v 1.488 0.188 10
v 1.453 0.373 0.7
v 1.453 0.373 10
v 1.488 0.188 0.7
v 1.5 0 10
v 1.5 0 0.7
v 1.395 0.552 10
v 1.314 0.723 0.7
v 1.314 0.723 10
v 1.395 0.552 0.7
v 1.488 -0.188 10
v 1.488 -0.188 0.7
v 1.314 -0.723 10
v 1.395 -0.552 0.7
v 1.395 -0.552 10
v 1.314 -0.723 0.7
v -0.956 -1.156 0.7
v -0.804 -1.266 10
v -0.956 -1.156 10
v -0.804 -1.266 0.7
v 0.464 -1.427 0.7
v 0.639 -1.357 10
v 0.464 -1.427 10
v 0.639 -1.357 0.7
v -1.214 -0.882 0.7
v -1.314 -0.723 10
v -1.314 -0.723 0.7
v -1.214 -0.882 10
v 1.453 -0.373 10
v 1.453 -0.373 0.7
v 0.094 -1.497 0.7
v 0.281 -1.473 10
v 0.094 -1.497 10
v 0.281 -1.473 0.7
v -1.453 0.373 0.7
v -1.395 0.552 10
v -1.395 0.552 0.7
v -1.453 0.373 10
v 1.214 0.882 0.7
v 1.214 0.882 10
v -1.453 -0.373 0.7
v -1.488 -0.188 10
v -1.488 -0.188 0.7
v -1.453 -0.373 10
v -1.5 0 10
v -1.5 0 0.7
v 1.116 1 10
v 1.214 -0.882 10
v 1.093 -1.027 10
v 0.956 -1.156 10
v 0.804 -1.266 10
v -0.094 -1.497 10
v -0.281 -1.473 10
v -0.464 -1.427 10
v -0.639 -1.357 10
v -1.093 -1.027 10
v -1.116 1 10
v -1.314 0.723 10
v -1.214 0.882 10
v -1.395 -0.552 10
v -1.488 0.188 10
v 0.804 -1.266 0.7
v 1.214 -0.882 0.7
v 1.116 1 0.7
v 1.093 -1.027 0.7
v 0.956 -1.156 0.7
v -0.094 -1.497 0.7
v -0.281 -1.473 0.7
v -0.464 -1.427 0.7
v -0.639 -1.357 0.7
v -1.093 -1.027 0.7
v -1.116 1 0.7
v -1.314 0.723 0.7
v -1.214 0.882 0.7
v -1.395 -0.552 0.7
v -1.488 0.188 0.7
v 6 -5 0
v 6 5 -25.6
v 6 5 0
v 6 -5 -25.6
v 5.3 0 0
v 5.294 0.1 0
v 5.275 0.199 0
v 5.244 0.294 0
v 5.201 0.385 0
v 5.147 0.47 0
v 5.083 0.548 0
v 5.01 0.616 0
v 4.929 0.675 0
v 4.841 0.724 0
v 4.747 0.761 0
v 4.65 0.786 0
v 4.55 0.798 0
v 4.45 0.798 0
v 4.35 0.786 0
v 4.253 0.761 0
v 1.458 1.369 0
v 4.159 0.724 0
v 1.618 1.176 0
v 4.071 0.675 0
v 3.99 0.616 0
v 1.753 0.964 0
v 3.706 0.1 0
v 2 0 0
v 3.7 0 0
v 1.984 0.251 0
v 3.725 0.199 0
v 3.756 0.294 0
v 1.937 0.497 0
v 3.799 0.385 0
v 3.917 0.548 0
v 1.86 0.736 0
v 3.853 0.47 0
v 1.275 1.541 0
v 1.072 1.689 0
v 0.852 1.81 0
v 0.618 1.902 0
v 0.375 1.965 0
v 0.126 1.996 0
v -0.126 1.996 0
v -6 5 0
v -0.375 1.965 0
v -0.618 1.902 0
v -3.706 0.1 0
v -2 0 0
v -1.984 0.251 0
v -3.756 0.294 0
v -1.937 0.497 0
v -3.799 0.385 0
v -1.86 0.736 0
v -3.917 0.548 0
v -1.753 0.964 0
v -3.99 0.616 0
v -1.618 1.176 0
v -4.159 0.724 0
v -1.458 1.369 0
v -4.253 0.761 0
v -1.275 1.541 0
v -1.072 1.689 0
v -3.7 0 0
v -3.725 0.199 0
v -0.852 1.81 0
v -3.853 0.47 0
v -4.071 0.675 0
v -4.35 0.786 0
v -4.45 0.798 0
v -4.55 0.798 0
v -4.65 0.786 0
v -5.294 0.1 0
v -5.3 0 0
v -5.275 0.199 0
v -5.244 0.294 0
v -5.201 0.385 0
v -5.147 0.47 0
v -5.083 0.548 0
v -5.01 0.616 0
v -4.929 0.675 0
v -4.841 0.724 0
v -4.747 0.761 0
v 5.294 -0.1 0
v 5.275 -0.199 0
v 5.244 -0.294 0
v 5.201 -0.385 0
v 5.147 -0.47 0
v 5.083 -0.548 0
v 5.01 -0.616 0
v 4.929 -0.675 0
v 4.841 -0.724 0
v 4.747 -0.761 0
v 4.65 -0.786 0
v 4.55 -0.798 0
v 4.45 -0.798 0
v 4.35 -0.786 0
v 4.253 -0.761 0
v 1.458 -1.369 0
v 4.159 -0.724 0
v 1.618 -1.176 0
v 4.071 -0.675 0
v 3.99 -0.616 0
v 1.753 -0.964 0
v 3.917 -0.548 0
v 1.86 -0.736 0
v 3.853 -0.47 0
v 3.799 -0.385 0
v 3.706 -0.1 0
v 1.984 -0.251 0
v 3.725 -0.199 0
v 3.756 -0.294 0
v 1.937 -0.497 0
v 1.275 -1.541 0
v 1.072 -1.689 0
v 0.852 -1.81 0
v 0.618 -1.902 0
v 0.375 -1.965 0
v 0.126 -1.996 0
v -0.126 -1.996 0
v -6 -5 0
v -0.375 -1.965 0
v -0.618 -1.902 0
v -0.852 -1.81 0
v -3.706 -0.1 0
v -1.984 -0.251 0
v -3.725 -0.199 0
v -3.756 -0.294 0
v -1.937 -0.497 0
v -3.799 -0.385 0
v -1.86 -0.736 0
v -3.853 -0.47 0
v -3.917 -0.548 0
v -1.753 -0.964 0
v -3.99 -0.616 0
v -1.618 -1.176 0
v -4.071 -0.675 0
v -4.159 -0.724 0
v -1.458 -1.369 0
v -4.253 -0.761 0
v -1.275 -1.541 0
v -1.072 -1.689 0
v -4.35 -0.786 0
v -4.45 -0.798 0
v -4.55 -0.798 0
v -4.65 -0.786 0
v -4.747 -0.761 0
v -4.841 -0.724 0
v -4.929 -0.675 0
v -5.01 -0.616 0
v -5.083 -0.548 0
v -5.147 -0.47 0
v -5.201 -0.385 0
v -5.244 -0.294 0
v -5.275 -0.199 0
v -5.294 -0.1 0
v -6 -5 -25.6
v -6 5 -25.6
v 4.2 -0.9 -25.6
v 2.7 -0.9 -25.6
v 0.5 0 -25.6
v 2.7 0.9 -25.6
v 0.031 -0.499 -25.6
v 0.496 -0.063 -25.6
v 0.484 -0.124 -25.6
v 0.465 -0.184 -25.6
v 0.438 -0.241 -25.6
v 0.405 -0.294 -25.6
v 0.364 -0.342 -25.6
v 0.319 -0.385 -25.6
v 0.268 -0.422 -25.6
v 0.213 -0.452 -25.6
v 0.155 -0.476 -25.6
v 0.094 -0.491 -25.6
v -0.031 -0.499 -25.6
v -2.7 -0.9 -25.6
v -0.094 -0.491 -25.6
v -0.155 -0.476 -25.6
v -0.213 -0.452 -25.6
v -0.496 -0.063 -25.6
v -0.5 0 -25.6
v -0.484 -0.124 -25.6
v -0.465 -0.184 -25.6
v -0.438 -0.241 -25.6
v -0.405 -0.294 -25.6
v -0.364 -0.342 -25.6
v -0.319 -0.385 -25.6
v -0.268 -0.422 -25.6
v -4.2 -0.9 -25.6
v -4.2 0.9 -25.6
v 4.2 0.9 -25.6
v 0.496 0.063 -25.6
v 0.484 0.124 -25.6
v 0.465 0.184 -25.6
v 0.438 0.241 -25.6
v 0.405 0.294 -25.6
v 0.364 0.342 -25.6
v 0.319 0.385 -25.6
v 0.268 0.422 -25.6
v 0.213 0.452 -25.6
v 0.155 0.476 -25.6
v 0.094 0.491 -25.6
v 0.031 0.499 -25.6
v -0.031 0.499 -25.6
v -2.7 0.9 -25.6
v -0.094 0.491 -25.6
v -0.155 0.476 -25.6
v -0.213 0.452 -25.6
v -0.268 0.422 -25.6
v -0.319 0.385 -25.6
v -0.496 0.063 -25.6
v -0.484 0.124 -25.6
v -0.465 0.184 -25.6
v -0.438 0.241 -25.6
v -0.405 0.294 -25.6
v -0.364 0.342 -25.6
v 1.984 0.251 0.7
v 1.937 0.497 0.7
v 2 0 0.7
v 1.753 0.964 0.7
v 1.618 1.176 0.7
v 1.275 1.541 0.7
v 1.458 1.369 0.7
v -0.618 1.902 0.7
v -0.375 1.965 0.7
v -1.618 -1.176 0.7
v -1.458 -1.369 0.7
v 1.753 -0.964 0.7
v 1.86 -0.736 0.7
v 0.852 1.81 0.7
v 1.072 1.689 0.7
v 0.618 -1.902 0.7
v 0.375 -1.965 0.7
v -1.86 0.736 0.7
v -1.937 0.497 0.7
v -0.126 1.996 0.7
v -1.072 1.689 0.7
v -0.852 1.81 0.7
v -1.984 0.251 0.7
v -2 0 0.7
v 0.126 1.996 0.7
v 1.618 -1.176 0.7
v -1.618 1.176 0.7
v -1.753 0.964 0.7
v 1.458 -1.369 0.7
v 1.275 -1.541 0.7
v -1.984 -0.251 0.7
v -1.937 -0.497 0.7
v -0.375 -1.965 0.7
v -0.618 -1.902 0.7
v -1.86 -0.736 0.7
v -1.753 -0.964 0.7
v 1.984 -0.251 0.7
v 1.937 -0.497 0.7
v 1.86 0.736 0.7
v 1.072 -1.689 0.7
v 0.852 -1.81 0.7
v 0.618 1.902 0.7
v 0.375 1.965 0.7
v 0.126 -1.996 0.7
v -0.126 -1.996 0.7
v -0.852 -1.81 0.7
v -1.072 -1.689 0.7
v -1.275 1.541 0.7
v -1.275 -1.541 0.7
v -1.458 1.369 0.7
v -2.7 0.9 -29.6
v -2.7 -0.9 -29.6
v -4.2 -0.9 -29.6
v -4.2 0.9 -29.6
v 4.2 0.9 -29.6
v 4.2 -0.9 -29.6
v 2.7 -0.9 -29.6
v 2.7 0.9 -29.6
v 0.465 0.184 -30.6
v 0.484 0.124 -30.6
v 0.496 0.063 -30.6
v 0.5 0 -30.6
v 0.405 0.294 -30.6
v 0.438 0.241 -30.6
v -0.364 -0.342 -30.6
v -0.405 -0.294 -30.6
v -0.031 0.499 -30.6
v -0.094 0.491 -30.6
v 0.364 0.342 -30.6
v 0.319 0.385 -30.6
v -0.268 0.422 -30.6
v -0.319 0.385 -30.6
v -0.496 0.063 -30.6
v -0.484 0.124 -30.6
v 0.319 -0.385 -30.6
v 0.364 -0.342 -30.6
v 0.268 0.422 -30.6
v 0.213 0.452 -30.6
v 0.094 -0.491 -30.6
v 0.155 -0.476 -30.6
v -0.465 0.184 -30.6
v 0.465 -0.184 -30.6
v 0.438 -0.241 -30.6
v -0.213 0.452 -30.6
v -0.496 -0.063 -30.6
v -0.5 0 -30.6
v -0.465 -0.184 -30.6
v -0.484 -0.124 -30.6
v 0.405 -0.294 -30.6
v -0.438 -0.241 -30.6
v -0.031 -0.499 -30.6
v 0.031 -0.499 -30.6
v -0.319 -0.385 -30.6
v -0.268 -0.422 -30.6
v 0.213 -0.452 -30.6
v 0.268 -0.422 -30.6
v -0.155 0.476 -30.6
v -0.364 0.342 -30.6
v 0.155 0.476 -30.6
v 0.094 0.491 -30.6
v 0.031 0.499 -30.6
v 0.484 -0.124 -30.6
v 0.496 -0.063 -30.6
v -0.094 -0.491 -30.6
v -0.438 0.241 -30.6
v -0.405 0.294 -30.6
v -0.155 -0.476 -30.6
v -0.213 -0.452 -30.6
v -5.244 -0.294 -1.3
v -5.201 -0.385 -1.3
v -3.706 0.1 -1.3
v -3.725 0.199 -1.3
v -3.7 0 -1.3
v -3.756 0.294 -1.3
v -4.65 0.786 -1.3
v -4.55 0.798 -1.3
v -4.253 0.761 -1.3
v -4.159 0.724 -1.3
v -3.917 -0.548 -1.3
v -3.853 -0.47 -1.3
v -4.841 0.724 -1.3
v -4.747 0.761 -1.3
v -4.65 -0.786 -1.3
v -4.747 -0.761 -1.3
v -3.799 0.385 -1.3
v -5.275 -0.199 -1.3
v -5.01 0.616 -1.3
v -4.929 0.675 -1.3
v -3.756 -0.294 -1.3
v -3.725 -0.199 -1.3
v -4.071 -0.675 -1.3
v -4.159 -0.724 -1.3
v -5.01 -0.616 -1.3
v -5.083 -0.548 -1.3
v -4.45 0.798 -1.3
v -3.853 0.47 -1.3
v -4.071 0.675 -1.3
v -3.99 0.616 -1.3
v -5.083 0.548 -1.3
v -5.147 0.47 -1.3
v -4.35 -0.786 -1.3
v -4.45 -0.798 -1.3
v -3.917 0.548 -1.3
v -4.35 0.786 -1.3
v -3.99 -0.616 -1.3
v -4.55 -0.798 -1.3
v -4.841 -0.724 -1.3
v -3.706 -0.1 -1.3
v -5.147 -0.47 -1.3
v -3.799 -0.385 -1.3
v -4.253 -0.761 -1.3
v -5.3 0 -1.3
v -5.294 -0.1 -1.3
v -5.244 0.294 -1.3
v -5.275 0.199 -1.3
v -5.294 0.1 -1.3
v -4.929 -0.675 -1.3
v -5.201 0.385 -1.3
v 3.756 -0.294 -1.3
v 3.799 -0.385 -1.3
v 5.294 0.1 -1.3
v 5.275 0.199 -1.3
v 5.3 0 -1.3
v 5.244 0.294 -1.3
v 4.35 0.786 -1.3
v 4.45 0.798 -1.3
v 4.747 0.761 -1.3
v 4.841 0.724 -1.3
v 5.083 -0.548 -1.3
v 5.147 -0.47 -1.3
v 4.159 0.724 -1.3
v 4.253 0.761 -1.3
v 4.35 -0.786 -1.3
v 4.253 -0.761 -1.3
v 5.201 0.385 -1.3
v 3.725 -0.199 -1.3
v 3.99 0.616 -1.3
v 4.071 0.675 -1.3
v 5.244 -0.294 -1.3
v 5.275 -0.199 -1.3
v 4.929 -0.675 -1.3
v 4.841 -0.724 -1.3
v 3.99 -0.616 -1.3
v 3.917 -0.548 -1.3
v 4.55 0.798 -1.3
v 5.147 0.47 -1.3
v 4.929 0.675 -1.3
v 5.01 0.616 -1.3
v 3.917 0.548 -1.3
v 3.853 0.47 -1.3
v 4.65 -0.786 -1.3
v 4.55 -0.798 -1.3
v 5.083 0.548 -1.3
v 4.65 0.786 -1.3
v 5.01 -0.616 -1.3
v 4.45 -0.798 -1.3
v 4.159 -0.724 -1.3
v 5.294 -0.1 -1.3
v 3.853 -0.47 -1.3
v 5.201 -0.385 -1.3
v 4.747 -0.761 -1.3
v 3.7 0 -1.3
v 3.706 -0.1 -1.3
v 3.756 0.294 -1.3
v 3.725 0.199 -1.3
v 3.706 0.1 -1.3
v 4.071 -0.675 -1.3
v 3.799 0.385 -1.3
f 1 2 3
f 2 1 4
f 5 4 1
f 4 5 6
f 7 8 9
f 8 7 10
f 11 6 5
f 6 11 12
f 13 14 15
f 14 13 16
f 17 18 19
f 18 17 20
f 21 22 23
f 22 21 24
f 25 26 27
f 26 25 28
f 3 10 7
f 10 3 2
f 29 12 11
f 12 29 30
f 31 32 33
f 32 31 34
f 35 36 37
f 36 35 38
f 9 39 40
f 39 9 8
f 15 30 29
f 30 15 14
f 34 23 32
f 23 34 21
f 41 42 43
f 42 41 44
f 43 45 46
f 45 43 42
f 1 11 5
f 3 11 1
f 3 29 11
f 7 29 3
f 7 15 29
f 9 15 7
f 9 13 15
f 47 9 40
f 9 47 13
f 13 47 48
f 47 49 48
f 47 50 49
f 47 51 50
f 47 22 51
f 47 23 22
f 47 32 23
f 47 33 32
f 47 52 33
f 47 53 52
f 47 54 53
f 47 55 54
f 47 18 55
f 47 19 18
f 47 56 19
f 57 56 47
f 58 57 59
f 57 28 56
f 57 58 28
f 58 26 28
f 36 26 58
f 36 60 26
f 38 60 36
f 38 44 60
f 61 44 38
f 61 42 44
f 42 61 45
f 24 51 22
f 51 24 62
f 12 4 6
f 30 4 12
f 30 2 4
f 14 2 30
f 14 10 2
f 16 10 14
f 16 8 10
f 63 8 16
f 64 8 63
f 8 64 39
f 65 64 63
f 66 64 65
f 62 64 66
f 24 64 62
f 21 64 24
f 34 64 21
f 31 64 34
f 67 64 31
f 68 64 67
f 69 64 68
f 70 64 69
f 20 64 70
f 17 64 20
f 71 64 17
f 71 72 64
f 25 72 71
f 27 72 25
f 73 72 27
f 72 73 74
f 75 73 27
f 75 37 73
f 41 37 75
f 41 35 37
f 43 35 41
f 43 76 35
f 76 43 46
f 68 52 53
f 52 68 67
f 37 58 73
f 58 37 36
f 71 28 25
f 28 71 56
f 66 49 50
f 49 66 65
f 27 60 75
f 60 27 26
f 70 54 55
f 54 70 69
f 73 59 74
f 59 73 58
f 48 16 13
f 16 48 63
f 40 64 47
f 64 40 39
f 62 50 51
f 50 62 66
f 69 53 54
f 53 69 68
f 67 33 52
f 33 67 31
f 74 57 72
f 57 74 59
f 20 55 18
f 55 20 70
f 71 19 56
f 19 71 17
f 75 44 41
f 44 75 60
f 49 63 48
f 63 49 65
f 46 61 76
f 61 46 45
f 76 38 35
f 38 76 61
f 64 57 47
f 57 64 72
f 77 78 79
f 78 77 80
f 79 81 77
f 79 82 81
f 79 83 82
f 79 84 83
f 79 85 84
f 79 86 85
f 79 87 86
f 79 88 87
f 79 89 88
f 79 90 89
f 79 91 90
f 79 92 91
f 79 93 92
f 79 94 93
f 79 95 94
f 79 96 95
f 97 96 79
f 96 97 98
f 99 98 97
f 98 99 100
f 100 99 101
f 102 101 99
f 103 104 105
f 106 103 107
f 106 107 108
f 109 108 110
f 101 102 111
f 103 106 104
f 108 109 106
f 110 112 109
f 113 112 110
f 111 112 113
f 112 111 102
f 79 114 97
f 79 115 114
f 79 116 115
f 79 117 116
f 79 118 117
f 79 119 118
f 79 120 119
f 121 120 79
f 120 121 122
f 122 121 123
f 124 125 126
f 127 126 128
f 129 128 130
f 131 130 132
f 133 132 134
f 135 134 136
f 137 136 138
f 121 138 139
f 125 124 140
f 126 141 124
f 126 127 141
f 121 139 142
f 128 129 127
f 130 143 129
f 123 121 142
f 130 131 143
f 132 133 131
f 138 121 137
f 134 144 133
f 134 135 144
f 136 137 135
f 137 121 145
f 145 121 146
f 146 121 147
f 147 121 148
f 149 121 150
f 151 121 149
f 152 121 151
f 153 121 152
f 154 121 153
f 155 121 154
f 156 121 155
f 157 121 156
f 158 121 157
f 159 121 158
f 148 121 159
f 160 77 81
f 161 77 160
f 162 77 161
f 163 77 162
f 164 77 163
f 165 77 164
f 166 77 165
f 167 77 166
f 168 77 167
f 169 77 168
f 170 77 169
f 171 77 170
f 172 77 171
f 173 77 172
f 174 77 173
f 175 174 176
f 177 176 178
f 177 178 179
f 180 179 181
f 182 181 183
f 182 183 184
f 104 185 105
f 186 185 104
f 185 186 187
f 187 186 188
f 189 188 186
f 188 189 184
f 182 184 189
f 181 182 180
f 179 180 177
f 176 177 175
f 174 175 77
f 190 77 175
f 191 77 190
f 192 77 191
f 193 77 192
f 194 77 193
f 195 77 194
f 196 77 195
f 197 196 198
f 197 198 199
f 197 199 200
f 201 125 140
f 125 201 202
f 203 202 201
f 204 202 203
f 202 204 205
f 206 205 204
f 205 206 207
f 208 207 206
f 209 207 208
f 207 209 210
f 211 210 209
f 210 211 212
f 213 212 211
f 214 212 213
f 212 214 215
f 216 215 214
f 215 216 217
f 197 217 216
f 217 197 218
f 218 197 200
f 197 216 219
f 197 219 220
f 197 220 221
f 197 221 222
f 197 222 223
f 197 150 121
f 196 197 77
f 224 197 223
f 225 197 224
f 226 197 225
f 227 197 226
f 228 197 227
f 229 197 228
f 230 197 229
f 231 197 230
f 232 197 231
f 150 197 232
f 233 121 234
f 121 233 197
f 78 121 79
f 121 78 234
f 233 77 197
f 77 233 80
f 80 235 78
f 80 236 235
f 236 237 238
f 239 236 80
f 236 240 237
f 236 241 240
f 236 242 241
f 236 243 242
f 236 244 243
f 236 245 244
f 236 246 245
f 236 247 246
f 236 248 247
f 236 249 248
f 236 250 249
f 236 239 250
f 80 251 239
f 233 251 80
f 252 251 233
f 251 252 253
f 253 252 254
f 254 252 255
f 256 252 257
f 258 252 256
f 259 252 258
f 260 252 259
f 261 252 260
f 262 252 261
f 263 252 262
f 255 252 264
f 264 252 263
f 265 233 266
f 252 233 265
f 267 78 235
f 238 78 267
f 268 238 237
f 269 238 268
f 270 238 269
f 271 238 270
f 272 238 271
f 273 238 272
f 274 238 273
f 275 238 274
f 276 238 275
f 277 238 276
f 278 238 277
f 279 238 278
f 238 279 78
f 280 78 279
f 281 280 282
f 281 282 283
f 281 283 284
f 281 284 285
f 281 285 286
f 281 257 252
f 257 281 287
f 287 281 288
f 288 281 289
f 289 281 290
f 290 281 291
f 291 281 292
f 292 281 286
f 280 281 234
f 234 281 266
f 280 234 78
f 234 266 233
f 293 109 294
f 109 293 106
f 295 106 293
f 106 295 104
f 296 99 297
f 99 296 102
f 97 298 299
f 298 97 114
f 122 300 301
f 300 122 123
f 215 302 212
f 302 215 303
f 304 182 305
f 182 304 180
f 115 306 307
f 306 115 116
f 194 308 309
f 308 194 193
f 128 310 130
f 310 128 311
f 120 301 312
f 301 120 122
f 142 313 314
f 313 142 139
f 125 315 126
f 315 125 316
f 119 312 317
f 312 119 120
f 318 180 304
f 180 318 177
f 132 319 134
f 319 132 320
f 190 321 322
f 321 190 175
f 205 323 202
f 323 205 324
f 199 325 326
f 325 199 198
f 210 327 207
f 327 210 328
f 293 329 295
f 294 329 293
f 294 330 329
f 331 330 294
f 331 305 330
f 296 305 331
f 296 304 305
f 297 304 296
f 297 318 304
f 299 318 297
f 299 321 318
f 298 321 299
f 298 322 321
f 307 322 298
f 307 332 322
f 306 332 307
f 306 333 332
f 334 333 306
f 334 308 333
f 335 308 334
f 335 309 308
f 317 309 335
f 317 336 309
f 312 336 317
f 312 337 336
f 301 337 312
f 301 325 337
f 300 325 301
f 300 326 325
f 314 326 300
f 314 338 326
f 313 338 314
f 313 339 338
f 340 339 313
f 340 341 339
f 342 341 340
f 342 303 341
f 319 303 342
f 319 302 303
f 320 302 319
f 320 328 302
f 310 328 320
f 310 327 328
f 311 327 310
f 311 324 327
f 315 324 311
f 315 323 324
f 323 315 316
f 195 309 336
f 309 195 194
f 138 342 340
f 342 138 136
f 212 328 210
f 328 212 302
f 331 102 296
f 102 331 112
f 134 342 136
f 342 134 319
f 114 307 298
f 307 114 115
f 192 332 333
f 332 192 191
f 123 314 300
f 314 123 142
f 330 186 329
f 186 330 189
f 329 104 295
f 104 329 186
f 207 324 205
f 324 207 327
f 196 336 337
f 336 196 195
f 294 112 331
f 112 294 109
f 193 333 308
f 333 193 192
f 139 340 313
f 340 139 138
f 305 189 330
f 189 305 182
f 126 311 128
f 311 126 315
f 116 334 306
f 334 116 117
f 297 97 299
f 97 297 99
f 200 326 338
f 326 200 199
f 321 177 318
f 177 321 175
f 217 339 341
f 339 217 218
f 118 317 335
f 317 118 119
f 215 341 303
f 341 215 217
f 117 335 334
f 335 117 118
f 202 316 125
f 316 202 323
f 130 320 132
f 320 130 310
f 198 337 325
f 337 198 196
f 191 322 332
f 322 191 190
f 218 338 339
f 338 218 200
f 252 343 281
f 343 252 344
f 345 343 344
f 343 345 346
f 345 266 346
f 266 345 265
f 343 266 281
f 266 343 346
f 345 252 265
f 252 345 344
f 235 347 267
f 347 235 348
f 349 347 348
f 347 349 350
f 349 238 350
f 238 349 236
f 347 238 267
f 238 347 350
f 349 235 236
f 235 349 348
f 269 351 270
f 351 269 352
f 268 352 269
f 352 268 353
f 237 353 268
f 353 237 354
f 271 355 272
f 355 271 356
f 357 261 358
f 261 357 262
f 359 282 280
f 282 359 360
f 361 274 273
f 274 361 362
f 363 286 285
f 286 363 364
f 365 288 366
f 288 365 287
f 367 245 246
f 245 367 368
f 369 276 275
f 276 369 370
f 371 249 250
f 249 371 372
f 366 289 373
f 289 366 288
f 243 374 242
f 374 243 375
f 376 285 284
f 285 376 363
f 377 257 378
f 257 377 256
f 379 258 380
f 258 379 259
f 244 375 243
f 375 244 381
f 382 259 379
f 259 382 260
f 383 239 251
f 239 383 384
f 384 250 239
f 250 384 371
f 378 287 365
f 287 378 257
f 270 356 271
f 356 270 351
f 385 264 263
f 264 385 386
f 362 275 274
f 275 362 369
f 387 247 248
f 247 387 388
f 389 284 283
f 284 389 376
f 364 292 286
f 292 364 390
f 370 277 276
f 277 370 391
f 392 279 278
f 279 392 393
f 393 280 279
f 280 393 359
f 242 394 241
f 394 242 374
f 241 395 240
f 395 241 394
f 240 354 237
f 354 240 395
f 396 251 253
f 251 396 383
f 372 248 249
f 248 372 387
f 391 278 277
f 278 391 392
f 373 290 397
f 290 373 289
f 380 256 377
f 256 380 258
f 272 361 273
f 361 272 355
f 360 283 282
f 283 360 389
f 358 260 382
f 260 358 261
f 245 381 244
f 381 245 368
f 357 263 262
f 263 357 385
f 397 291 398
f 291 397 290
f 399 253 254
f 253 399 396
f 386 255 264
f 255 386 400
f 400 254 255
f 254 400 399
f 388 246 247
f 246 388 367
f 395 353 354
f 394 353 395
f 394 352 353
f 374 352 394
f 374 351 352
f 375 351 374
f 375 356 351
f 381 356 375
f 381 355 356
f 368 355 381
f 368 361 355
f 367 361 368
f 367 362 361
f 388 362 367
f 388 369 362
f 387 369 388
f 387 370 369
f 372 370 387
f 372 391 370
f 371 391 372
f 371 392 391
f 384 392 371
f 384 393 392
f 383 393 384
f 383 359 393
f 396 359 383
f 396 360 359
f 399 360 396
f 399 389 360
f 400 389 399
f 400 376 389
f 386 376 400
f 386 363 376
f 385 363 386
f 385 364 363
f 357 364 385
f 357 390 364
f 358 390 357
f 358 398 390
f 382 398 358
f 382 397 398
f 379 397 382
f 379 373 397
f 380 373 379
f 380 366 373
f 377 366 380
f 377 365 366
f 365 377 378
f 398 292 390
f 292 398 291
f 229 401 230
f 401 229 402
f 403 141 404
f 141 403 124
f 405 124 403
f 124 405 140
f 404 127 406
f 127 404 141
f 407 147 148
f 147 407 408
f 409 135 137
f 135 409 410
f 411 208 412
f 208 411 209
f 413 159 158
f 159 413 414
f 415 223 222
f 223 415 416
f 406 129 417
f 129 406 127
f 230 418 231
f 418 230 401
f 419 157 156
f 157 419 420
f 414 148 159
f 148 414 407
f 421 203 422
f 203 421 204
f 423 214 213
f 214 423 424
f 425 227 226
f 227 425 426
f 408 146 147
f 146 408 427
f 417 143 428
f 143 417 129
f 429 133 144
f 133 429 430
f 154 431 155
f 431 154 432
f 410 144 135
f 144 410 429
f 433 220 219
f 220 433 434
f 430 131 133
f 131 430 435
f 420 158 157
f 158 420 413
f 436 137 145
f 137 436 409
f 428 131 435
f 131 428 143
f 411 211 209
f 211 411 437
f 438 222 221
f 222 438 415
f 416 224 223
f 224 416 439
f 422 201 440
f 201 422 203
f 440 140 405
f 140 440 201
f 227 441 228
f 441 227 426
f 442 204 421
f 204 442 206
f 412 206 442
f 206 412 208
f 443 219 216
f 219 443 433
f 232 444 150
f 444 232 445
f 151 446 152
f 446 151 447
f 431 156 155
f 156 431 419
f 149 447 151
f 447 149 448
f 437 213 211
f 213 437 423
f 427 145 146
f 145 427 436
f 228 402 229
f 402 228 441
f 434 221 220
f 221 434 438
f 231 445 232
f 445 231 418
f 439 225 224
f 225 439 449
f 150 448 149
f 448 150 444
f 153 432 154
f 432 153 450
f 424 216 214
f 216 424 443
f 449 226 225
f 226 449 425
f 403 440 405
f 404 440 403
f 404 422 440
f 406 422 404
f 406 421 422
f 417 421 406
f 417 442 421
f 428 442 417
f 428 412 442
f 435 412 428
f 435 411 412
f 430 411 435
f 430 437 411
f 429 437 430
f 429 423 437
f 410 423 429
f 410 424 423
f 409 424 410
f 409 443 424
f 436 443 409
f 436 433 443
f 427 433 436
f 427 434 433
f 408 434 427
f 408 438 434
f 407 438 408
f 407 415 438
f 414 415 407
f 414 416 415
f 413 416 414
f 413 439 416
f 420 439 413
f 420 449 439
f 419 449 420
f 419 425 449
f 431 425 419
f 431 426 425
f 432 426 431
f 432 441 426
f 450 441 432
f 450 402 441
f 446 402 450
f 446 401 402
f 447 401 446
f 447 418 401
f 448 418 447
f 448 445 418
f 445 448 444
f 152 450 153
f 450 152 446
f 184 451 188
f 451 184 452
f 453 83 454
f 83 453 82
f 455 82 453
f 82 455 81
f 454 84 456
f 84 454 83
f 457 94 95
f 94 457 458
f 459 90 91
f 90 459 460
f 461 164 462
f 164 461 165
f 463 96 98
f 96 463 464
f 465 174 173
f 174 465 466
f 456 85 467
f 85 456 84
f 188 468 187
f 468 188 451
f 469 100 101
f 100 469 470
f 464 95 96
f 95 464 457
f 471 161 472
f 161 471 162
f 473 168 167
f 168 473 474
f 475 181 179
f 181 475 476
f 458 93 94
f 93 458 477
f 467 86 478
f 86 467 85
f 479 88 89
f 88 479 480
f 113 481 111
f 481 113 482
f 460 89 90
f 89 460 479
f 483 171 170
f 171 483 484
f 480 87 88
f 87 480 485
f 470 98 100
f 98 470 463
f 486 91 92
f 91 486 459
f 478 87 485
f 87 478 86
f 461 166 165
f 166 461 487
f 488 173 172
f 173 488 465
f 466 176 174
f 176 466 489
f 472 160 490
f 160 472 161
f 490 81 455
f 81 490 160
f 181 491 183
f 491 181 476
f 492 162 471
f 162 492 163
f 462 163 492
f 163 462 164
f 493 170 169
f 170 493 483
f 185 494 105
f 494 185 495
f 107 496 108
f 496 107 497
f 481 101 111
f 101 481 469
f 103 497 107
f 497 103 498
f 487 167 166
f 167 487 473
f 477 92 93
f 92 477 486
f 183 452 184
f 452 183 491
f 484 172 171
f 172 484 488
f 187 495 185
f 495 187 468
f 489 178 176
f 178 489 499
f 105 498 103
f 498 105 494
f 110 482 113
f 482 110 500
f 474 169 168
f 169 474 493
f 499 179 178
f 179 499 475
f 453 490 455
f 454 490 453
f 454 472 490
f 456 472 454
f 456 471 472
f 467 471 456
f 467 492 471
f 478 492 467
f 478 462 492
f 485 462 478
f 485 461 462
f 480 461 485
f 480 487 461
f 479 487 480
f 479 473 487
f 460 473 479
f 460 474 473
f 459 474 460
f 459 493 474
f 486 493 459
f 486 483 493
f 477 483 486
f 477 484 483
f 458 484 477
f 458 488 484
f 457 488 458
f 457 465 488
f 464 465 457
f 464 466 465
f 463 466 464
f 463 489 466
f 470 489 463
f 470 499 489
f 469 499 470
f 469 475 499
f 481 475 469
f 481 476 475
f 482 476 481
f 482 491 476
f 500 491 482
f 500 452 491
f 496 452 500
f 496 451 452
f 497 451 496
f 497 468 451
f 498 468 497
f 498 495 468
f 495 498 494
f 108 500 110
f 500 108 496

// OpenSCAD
$fn = 50;

difference() {
	union() {
		translate(v = [0, 0, 0.7]) {
			rotate(a = [0, 0, 0]) {
				difference() {
					union() {
						cylinder(h = 9.3, r = 1.5);
					}
					union() {
						translate(v = [-6.0, 1.0, -1]) {
							cube(size = [12, 12, 11.3]);
						}
					}
				}
			}
		}
		translate(v = [-6.0, -5.0, -9]) {
			cube(size = [12, 10, 9]);
		}
		translate(v = [-6.0, -5.0, -25.6]) {
			cube(size = [12, 10, 16.6]);
		}
		cylinder(h = 0.7, r = 2.0);
		translate(v = [-4.2, -0.9, -29.6]) {
			cube(size = [1.5, 1.8, 4]);
		}
		translate(v = [2.7, -0.9, -29.6]) {
			cube(size = [1.5, 1.8, 4]);
		}
		translate(v = [0, 0, -30.6]) {
			cylinder(h = 5, r = 0.5);
		}
	}
	union() {
		translate(v = [-4.5, 0, -1.3]) {
			cylinder(h = 1.31, r = 0.8);
		}
		translate(v = [4.5, 0, -1.3]) {
			cylinder(h = 1.31, r = 0.8);
		}
	}
}
